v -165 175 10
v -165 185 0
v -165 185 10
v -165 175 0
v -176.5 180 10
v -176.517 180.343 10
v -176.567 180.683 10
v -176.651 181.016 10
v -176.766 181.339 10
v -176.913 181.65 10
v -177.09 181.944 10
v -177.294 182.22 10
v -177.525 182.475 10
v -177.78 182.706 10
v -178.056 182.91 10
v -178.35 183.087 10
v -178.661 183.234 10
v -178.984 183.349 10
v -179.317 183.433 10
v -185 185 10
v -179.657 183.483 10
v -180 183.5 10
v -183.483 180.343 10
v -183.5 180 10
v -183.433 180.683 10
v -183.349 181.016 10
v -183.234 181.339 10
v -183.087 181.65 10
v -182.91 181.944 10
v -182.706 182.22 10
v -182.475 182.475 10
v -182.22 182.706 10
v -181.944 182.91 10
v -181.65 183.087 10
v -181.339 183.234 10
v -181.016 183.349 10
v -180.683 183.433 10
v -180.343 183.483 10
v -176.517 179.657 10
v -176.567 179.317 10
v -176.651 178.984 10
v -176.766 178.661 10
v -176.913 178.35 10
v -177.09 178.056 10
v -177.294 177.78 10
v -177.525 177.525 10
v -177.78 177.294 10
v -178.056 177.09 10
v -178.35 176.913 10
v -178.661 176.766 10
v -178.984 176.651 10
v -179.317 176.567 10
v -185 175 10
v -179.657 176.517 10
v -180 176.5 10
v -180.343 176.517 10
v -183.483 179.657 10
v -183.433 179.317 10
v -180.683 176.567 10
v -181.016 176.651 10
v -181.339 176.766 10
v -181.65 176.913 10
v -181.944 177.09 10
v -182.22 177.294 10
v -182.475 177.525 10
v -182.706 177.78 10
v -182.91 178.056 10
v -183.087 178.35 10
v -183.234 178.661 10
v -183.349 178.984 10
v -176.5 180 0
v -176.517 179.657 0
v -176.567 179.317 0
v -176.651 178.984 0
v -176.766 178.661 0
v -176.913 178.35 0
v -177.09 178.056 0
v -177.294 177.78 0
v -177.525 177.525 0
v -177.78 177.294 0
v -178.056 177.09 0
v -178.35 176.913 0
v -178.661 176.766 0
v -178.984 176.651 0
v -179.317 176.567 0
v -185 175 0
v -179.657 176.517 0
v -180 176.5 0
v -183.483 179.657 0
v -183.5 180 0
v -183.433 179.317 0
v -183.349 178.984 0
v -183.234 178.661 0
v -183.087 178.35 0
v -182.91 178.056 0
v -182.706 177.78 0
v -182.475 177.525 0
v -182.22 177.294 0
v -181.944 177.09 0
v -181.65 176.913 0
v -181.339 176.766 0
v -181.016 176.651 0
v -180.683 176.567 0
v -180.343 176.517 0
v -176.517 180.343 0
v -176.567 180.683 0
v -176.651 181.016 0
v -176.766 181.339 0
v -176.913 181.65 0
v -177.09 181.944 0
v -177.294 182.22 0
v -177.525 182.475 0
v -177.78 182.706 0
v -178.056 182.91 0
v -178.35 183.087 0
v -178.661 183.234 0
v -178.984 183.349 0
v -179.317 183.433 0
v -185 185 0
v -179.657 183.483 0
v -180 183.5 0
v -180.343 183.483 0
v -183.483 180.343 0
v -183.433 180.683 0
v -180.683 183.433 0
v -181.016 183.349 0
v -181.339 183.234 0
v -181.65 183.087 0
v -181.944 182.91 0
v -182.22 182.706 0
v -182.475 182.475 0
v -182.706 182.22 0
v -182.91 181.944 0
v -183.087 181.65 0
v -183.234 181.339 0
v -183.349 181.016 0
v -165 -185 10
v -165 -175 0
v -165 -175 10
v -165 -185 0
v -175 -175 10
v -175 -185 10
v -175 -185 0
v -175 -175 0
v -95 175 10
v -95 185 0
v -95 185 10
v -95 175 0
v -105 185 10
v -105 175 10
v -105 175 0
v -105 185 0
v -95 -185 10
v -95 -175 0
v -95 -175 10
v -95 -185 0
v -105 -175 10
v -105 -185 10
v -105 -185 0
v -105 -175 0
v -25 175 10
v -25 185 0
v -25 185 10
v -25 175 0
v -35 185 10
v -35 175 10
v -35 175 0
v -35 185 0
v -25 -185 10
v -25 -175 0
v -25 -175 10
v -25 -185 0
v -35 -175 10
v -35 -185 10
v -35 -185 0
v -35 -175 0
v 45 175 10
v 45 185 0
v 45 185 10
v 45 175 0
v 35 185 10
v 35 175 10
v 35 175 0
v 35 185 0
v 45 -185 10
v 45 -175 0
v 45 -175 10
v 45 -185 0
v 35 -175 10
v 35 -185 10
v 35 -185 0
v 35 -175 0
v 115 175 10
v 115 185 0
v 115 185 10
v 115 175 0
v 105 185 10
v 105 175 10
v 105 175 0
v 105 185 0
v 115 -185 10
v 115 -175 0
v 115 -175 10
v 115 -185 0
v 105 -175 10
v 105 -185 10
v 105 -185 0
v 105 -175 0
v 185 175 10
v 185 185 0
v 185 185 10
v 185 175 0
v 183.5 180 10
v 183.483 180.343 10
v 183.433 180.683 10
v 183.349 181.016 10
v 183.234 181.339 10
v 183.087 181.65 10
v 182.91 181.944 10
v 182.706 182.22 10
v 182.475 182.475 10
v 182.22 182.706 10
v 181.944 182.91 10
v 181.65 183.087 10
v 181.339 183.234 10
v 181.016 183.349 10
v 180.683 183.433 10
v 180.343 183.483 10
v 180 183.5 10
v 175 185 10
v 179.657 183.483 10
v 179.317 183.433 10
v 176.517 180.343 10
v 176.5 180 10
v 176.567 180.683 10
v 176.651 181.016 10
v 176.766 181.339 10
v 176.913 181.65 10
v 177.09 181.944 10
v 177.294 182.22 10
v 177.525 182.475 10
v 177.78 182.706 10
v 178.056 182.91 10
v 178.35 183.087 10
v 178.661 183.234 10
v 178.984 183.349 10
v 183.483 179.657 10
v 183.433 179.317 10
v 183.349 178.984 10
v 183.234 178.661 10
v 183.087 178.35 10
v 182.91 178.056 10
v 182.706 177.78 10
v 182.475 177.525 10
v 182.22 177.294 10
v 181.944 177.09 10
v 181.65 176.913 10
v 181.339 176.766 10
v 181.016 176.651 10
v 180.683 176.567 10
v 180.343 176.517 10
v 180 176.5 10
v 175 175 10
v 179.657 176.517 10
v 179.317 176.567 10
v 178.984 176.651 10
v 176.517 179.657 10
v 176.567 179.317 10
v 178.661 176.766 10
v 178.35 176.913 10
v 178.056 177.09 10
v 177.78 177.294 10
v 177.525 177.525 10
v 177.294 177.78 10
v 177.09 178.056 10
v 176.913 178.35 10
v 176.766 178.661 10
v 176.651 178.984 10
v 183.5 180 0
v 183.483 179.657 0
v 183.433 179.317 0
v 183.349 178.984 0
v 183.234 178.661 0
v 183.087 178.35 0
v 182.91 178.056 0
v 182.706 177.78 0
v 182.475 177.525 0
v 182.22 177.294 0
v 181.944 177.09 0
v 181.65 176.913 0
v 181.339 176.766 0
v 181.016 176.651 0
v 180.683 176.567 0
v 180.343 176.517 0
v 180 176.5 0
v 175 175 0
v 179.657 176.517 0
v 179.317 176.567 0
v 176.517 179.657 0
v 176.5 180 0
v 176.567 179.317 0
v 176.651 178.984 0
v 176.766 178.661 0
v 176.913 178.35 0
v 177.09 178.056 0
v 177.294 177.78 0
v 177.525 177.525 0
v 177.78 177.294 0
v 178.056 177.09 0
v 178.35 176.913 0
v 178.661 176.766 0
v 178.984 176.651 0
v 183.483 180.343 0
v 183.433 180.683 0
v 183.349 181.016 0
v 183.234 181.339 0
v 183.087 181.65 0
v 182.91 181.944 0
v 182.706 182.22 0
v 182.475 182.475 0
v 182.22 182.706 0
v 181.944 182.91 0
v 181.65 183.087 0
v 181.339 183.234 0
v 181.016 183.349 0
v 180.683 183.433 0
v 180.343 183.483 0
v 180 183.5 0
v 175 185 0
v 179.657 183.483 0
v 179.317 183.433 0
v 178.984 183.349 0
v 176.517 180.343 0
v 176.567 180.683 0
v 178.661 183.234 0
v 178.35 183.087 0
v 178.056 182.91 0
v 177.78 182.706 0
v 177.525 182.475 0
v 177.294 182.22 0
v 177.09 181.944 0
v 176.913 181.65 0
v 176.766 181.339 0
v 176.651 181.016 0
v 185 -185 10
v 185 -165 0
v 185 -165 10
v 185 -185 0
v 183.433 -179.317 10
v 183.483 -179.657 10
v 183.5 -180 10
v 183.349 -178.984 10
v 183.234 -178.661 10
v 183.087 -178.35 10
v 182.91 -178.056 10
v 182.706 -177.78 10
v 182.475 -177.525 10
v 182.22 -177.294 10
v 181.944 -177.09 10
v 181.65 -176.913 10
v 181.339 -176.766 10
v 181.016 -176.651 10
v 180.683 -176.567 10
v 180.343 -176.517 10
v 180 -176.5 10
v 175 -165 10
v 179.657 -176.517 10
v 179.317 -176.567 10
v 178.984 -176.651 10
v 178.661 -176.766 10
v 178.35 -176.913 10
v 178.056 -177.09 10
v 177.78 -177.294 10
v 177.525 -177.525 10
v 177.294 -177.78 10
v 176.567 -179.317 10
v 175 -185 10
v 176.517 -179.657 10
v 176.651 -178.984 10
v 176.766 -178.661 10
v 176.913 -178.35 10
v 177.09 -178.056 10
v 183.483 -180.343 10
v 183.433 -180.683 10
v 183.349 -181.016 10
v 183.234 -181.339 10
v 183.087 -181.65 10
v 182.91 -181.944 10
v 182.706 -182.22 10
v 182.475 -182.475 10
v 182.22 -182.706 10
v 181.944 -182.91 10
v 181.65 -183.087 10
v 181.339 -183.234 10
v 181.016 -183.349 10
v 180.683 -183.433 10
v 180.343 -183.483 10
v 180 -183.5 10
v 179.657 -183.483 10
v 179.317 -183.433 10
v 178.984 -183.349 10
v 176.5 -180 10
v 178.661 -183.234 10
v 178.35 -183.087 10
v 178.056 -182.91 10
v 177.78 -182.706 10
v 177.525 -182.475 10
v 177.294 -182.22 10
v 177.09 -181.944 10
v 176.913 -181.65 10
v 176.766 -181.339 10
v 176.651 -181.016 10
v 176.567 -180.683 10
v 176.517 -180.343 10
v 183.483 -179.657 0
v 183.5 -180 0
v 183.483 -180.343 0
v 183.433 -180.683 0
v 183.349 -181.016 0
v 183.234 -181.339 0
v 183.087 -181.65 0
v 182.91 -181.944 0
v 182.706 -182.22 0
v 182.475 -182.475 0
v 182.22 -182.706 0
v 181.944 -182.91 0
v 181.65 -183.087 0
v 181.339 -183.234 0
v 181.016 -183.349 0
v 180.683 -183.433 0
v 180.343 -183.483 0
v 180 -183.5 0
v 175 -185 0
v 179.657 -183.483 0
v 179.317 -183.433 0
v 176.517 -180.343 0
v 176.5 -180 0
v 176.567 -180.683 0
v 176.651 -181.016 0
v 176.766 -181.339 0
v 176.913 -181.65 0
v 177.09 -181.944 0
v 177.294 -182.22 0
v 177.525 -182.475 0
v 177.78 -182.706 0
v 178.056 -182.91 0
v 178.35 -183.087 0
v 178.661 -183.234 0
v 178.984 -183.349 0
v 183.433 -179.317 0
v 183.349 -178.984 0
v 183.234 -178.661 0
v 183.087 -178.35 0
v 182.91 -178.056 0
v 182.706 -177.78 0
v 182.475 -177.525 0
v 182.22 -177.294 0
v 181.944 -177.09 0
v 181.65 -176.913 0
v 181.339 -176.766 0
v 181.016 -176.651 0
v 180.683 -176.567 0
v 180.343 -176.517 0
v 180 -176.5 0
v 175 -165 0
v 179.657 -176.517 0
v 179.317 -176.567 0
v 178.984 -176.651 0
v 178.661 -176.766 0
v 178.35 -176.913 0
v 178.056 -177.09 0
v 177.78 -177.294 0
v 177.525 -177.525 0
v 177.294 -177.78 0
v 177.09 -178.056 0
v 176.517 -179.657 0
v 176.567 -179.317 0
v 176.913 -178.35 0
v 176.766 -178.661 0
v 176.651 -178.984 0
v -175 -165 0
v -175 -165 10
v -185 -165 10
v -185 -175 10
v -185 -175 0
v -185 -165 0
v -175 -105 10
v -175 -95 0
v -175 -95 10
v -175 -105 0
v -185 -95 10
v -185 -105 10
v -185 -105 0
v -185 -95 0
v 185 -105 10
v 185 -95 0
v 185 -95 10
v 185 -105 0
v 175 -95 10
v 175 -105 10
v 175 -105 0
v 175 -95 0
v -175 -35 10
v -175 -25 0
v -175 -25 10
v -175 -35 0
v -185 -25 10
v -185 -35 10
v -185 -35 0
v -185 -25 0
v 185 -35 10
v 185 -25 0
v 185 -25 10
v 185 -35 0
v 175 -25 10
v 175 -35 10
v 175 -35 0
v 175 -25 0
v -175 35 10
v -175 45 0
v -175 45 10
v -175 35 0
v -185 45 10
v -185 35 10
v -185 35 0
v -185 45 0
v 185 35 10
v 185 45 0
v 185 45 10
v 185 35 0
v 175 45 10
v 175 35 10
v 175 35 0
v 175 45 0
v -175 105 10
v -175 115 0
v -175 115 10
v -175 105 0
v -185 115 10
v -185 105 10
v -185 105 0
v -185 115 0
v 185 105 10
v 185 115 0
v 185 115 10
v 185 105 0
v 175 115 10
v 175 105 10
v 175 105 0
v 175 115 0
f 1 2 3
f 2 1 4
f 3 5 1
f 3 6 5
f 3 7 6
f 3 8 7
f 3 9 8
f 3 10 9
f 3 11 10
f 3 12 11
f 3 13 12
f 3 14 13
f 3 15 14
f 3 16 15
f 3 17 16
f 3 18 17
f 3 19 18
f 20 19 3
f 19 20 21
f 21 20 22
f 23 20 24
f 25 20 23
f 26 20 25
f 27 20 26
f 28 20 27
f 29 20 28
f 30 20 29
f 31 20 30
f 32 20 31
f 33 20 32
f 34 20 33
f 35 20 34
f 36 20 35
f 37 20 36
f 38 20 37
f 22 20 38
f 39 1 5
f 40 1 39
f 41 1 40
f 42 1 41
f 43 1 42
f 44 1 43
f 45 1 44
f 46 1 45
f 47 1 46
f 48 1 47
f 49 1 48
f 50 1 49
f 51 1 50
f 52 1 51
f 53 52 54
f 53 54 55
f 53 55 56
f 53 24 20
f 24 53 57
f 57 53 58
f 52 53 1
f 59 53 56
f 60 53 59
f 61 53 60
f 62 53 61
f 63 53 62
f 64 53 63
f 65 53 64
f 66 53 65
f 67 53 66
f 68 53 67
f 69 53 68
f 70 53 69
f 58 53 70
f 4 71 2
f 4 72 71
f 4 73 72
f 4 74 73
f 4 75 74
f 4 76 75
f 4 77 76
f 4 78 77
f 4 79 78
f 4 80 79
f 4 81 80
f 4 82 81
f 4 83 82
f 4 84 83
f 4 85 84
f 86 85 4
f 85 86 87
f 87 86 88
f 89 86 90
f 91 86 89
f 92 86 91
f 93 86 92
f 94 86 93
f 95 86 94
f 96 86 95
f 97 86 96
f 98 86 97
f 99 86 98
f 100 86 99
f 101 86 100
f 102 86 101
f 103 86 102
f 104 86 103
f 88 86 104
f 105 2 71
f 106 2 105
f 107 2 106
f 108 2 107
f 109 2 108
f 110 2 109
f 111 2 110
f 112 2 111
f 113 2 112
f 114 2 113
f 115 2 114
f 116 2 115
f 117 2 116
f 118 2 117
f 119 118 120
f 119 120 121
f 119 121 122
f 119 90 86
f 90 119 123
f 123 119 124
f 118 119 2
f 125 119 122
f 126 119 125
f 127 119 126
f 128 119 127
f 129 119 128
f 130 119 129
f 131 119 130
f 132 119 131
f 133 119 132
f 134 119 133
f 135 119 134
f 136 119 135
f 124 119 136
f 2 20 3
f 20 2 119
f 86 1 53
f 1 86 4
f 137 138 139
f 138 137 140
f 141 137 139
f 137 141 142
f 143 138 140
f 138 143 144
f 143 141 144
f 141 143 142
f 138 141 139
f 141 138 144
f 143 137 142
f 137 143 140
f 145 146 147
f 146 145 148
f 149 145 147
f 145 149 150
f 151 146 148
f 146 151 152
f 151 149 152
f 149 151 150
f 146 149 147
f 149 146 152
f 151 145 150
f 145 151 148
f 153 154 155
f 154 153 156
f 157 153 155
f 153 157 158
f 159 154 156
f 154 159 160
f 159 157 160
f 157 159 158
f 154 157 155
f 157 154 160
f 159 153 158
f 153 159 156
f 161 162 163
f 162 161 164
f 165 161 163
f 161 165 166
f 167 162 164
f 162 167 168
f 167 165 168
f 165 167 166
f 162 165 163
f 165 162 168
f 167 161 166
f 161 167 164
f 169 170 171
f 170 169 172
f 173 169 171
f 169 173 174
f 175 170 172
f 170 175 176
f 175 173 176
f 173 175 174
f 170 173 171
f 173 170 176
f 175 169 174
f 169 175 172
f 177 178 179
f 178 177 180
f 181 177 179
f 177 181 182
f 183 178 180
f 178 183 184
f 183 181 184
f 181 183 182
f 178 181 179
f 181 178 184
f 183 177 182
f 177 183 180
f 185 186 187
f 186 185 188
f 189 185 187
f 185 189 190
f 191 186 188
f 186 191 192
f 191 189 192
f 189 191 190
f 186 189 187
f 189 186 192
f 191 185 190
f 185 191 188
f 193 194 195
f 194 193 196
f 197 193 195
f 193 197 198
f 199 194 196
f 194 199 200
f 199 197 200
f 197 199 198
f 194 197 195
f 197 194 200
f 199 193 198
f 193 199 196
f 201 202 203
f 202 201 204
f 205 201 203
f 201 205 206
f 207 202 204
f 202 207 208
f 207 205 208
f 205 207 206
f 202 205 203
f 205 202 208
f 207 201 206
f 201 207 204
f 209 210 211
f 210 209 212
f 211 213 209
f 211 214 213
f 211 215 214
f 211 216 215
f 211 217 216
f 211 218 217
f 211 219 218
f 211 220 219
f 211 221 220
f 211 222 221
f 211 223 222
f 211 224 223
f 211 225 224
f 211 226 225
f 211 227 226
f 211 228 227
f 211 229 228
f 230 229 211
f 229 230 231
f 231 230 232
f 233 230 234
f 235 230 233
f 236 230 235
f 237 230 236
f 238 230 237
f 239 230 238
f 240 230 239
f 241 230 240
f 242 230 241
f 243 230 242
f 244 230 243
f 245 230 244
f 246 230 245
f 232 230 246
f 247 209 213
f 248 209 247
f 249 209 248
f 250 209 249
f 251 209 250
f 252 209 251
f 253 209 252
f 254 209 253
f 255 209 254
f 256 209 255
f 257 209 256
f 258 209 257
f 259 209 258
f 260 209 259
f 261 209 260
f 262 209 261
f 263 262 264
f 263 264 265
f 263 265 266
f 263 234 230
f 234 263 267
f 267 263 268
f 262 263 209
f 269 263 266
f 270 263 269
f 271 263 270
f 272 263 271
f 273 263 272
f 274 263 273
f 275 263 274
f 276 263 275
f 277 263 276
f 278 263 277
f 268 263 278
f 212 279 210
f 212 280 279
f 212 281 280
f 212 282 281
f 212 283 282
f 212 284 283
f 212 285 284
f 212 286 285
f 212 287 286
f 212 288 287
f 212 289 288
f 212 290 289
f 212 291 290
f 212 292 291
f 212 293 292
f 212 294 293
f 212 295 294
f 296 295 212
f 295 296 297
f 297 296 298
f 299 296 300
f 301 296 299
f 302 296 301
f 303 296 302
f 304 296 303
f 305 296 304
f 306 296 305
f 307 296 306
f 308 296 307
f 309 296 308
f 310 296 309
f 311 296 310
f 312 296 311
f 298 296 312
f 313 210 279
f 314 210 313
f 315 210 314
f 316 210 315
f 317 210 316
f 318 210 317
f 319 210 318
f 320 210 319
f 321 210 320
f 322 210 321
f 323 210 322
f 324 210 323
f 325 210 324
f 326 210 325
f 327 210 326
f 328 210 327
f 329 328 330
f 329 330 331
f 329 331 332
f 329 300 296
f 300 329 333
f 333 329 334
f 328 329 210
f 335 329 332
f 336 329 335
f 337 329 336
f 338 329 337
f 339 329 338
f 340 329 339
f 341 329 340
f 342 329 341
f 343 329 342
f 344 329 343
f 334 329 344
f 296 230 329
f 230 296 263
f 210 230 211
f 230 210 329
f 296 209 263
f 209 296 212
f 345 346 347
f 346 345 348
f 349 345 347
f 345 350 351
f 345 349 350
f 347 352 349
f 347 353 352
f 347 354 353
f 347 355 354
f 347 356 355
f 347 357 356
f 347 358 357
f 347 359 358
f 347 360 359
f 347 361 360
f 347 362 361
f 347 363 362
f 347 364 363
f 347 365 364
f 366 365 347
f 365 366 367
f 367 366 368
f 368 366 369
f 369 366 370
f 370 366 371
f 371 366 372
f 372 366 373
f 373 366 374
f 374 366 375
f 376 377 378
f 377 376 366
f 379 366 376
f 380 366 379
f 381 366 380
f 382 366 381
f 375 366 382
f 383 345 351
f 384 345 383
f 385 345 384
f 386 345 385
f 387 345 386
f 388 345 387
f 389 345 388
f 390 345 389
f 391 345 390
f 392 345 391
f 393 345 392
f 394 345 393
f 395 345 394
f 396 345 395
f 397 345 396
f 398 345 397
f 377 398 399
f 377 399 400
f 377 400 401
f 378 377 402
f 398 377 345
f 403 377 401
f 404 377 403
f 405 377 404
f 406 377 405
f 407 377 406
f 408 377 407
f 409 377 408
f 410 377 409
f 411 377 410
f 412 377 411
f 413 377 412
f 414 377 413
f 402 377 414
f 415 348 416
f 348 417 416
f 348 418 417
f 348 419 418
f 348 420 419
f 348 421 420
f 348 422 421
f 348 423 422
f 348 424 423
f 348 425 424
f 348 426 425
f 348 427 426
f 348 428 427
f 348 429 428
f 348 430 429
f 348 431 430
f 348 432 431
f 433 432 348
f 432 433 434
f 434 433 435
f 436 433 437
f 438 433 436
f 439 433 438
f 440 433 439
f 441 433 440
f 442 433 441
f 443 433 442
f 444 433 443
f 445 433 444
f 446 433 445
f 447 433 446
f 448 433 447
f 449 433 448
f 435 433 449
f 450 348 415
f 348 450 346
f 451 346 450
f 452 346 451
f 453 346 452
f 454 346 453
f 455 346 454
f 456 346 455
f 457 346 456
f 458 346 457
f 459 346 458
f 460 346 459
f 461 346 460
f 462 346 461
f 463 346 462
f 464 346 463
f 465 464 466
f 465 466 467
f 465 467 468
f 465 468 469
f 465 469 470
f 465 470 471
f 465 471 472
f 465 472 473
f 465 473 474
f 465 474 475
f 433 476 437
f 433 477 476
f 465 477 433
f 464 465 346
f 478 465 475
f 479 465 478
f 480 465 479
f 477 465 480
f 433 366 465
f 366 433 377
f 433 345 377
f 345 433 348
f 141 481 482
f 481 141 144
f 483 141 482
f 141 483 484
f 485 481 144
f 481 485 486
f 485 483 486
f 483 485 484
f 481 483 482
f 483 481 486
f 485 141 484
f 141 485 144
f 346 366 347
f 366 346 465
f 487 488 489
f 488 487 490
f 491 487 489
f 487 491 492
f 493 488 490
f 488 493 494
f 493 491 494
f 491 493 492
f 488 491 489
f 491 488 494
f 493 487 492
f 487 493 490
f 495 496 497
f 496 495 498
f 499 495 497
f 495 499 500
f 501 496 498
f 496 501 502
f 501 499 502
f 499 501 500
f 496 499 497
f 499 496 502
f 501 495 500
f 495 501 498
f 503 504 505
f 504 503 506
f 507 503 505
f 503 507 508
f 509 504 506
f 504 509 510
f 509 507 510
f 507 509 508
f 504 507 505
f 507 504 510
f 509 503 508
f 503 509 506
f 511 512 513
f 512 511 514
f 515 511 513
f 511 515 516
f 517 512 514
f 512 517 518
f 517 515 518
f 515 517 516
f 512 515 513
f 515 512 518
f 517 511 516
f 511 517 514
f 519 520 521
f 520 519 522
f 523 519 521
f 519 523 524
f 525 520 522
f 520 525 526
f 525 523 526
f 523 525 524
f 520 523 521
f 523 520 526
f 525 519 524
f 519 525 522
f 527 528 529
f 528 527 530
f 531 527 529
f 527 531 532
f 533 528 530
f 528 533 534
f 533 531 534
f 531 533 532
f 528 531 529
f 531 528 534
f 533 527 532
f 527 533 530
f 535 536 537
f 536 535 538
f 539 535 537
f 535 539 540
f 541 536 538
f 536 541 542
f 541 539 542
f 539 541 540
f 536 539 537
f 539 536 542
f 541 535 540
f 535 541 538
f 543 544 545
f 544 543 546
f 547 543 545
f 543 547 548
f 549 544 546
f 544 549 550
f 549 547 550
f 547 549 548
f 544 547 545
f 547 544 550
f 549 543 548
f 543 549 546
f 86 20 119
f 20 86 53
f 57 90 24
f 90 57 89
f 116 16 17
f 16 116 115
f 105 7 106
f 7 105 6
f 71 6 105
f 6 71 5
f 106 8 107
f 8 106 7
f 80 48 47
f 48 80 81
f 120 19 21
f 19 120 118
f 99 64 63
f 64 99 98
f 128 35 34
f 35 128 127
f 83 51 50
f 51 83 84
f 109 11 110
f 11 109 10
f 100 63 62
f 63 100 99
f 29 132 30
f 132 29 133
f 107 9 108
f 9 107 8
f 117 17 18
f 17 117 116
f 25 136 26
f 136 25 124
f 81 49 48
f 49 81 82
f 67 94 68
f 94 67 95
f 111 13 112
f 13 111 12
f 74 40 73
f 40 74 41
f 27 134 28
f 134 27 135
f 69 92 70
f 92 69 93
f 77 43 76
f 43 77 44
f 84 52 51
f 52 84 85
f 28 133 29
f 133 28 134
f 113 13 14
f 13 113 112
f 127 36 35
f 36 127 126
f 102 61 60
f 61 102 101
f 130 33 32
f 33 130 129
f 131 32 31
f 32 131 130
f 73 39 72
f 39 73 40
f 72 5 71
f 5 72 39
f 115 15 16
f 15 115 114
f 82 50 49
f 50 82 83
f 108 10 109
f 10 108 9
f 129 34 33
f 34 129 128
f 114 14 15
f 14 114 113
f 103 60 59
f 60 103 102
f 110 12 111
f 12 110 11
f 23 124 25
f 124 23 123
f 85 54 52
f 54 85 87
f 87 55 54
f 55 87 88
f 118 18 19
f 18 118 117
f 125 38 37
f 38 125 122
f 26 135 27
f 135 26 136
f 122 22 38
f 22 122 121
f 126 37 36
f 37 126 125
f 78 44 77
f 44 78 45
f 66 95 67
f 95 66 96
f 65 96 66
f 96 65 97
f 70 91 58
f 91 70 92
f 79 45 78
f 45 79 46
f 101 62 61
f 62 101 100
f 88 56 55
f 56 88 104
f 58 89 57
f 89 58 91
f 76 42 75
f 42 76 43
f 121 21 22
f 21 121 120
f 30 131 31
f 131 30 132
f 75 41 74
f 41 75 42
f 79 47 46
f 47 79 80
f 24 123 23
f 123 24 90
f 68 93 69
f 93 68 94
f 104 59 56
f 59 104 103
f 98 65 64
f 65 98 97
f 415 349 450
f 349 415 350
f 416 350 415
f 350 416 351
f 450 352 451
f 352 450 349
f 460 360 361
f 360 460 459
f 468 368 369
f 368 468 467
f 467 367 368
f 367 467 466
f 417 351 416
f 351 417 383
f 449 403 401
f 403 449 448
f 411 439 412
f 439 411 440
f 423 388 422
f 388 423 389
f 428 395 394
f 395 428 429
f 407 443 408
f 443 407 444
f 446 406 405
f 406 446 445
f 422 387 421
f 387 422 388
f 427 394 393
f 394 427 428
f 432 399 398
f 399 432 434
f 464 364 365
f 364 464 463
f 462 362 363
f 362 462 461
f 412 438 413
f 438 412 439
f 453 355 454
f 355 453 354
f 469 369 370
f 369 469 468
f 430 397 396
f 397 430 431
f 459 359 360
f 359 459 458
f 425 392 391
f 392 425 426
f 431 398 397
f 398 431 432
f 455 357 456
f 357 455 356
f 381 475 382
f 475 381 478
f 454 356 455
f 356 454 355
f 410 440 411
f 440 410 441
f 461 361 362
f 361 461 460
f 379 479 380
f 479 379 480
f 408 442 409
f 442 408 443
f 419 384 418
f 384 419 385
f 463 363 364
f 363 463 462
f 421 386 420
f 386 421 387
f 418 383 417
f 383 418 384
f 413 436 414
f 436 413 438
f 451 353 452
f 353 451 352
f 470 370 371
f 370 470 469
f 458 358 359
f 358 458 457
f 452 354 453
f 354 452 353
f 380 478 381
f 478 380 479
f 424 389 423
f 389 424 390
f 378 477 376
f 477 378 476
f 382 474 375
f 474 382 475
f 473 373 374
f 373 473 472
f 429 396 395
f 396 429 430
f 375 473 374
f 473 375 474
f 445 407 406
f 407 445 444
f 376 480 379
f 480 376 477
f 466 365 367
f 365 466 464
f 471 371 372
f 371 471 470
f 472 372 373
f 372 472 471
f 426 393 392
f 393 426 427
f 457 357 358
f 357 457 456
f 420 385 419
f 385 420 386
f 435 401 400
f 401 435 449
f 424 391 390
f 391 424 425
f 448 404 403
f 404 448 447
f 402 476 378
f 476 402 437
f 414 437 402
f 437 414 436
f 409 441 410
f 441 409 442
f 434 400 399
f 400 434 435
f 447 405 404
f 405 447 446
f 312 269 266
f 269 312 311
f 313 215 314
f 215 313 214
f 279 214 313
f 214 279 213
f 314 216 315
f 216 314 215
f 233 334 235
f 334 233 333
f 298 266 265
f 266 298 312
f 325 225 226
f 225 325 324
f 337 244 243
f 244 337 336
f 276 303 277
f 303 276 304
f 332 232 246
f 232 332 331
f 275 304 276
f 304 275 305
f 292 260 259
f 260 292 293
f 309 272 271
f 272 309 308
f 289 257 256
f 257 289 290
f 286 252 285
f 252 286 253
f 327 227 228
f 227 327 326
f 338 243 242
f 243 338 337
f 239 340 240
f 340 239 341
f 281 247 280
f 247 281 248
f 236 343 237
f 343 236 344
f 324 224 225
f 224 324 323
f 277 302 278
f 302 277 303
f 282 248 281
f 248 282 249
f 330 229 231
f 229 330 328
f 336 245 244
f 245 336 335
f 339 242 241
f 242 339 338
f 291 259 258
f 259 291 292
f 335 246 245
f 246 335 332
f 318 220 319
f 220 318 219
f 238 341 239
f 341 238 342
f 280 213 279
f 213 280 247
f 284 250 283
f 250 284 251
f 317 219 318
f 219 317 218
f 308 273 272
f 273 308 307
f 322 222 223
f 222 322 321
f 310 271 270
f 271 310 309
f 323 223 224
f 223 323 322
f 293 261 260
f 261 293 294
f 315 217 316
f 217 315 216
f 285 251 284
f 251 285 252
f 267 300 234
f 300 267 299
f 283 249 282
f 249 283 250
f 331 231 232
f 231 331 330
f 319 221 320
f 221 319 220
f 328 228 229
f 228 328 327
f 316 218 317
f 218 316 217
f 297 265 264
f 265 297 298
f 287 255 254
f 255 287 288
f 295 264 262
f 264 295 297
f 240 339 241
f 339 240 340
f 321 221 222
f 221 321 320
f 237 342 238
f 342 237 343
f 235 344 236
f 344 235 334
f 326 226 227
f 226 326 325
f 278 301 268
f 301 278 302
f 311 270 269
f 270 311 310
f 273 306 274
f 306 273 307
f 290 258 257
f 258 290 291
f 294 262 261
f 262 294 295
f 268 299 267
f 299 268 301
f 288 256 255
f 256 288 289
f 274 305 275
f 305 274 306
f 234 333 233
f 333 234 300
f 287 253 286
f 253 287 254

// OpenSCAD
// ring_66.scad - ring index 66 (z bottom = 660 mm)
$fn = 64; bar = 10; half_b = bar/2; outer = 370; half_outer = outer/2;
front_y = 180; back_y = -180; left_x = -180; right_x = 180;
x_centers = [-170, -100, -30, 40, 110, 180];
z_centers = [5, 85, 155, 225, 295, 365, 435, 505, 575, 645, 715]; ring_z = 660;
module place_box(cx, cy, sx, sy) { translate([cx - sx/2, cy - sy/2, 0]) cube([sx, sy, bar]); }

difference() { union() {
    for (x = x_centers) { place_box(x, front_y, bar, bar); place_box(x, back_y, bar, bar); }
    for (y = x_centers) { place_box(left_x, y, bar, bar); place_box(right_x, y, bar, bar); }
    for (zc = z_centers) if ((zc - half_b < ring_z + bar) && (zc + half_b > ring_z)) {
        translate([-half_outer, front_y - half_b, 0]) cube([outer, bar, bar]);
        translate([-half_outer, back_y - half_b, 0])  cube([outer, bar, bar]);
        translate([left_x - half_b, -half_outer, 0])  cube([bar, outer, bar]);
        translate([right_x - half_b, -half_outer, 0]) cube([bar, outer, bar]);
    }
  }
  for (cx = [-180, 180]) for (cy = [-180, 180]) translate([cx, cy, 0]) cylinder(h = bar, r = 3.5, $fn = 64);
}
